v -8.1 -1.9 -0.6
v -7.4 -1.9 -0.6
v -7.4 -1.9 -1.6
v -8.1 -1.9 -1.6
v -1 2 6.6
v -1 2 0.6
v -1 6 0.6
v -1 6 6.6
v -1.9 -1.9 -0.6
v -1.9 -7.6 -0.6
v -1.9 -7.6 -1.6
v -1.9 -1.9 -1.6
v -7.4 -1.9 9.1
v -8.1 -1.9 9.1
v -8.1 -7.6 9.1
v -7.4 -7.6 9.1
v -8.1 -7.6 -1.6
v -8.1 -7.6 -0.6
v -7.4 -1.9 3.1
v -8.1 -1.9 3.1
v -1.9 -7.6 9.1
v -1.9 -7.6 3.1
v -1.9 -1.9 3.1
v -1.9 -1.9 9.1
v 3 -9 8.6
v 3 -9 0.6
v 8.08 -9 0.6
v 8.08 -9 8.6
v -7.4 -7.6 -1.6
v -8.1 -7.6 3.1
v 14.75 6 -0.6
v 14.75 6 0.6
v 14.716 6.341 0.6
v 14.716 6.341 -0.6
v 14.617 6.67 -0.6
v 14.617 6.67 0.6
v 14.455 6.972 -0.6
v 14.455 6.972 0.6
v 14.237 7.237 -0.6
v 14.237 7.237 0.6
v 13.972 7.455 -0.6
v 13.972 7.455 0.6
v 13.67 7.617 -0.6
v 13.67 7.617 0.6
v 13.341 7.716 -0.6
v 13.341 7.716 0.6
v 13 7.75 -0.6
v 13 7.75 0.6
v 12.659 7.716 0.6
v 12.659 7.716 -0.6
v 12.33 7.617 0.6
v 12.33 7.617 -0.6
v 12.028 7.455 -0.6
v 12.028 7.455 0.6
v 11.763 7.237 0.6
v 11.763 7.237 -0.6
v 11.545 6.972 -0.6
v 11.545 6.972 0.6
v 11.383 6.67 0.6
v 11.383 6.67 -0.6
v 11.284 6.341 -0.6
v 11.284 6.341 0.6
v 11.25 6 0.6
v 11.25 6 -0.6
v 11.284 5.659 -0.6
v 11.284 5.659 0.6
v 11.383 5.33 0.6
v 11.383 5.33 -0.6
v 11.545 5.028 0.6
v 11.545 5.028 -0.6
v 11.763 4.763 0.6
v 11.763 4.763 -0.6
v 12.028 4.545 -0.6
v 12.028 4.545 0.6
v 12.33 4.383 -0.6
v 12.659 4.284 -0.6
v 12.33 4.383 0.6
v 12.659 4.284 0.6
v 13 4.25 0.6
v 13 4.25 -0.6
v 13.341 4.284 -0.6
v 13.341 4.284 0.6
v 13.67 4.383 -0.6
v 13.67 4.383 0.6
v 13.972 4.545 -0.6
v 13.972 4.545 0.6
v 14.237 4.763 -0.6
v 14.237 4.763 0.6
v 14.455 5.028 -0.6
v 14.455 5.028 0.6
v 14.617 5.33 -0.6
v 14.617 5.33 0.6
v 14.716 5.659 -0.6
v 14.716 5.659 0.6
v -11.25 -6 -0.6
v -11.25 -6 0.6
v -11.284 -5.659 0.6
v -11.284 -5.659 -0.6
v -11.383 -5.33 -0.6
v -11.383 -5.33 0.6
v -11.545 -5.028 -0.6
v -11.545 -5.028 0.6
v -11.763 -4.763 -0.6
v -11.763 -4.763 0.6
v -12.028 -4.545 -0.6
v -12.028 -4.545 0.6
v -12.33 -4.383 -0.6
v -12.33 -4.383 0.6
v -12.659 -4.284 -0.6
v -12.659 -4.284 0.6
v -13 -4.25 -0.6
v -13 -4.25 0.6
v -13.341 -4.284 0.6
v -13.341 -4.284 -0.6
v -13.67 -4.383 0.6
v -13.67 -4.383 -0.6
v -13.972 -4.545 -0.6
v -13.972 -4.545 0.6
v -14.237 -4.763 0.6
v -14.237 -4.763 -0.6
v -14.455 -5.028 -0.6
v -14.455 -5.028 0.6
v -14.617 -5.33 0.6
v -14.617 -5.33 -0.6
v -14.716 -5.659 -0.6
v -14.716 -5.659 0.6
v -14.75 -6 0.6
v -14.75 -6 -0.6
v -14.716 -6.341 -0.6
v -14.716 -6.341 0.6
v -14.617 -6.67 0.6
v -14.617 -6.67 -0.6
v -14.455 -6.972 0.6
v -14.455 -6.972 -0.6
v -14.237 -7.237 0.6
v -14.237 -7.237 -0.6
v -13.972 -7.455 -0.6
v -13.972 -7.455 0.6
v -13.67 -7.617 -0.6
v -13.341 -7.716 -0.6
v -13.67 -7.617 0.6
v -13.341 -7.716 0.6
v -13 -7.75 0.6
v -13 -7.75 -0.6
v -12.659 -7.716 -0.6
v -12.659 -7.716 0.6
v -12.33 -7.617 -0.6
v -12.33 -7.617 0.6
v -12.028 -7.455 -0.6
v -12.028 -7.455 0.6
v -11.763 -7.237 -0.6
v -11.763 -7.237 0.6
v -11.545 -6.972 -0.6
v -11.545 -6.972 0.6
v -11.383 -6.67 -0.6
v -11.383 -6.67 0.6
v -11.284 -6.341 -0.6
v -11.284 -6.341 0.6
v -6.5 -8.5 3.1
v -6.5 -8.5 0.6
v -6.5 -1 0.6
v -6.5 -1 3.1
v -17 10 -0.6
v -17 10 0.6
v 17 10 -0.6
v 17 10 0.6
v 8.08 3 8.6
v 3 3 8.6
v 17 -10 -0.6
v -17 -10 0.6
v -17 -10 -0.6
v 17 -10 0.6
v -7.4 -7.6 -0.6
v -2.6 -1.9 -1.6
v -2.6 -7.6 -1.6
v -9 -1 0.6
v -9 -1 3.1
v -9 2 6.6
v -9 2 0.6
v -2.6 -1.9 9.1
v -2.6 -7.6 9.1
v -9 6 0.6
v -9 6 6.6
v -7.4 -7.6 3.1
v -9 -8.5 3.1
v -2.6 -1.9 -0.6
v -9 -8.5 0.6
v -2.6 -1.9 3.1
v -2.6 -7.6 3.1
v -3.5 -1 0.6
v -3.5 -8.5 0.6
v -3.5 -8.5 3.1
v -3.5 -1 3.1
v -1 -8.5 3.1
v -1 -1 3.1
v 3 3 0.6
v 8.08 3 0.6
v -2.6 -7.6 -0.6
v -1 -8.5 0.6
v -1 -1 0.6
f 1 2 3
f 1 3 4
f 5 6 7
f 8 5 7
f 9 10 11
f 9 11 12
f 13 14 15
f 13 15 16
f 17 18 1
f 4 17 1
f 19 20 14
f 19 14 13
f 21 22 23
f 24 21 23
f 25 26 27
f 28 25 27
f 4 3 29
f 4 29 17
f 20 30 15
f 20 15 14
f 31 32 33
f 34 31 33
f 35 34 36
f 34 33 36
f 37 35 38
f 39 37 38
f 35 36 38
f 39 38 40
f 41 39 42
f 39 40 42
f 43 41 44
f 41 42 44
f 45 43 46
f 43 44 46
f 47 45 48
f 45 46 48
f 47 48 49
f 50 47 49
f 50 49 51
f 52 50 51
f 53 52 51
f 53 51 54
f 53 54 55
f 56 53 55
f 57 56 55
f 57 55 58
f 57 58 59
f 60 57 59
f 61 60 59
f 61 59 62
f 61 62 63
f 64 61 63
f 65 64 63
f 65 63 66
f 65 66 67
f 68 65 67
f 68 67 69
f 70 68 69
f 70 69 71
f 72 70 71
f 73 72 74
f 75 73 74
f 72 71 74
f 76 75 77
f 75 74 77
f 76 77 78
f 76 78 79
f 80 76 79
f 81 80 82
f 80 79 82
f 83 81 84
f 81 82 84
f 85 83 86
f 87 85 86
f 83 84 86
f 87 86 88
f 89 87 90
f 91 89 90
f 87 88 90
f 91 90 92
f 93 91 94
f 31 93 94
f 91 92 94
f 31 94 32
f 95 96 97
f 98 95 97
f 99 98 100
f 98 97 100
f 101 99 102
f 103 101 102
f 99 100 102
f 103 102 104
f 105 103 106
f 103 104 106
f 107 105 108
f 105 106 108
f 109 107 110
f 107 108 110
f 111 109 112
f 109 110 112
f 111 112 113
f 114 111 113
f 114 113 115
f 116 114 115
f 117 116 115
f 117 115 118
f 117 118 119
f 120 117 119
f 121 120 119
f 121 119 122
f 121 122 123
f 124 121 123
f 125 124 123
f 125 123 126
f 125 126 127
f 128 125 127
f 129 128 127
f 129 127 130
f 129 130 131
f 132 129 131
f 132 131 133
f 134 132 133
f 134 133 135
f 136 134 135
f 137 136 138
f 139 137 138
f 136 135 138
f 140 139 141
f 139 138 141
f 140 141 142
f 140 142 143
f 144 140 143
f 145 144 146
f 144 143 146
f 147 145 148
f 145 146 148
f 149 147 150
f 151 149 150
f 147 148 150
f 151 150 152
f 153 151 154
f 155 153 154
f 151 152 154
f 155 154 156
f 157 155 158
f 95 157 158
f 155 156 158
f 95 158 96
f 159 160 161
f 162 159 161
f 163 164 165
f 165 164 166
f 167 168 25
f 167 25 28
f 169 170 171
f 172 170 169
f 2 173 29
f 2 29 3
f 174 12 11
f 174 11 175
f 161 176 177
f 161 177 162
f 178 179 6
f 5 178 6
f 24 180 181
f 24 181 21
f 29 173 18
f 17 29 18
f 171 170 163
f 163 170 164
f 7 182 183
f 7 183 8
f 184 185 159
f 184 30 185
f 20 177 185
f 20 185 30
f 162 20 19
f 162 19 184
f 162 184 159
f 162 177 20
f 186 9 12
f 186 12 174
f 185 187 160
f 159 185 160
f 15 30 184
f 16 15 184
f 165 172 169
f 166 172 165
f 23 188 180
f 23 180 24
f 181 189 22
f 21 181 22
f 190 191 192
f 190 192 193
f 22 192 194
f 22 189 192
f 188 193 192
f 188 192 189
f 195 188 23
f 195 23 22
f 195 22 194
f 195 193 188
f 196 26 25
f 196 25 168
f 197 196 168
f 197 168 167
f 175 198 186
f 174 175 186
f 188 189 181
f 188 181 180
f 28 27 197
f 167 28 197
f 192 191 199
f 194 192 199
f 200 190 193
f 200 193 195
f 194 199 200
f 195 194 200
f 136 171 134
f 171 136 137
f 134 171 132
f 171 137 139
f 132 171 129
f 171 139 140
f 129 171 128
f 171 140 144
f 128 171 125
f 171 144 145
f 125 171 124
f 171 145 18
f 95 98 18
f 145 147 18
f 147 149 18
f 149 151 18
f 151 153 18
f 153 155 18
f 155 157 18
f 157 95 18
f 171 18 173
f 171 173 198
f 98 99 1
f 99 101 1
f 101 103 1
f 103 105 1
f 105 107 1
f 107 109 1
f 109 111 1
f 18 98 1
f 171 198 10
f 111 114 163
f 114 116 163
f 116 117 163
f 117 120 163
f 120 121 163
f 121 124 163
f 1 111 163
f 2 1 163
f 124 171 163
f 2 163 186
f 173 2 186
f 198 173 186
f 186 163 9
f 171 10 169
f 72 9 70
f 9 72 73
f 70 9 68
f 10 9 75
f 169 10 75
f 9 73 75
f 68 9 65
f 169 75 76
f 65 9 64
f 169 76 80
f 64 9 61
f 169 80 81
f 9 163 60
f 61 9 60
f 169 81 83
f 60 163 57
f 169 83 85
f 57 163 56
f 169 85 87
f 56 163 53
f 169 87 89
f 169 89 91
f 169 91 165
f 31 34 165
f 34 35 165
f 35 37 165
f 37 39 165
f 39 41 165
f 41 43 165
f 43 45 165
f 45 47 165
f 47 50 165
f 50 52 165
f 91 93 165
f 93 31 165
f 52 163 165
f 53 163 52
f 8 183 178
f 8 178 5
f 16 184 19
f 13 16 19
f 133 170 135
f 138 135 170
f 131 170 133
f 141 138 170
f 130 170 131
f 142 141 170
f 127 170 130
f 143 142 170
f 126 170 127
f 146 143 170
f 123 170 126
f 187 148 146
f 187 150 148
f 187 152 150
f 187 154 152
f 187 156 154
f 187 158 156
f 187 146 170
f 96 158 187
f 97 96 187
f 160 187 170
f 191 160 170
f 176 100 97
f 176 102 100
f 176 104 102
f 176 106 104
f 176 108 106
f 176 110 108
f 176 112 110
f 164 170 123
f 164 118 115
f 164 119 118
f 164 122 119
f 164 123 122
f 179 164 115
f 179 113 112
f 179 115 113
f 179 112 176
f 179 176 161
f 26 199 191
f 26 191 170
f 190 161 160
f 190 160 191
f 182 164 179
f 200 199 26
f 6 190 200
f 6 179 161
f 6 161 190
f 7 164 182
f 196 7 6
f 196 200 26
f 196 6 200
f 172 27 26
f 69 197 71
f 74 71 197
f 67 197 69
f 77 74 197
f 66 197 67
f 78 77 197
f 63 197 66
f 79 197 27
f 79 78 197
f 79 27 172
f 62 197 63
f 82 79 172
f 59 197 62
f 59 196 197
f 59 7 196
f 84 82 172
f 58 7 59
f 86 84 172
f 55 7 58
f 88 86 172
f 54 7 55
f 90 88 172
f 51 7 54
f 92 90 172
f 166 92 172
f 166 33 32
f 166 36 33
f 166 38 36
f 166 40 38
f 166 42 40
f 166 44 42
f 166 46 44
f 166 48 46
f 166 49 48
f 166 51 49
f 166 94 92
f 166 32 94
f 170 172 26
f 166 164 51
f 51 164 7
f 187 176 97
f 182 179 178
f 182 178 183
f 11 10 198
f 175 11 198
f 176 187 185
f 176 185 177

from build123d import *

# Parameters (mm, degrees)
SKETCH1_W           = 34
SKETCH1_H           = 20
BOSS_EXTRUDE1_DEPTH = 0.6
SKETCH2_W           = 2.5
SKETCH2_H           = 7.5
BOSS_EXTRUDE2_DEPTH = 2.5
SKETCH3_W           = 0.7
SKETCH3_H           = 5.7
BOSS_EXTRUDE3_DEPTH = 6
SKETCH4_W           = 0.7
SKETCH4_H           = 5.7
BOSS_EXTRUDE4_DEPTH = 1
SKETCH6_W           = 5.08
SKETCH6_H           = 12
BOSS_EXTRUDE5_DEPTH = 8
SKETCH7_W           = 8
SKETCH7_H           = 4
BOSS_EXTRUDE6_DEPTH = 6
SKETCH8_R           = 1.75
CUT_EXTRUDE1_DEPTH  = 22.476731595


with BuildPart() as part:
    # Sketch1 → Boss-Extrude1 (new, symmetric)
    with BuildSketch(Plane.XY):
        Rectangle(SKETCH1_W, SKETCH1_H)
    extrude(amount=BOSS_EXTRUDE1_DEPTH, both=True)

    # Sketch2 → Boss-Extrude2 (add)
    with BuildSketch(Plane.XY.offset(0.6)):
        with Locations((-7.75, -4.75)):
            Rectangle(SKETCH2_W, SKETCH2_H)
        with Locations((-2.25, -4.75)):
            Rectangle(SKETCH2_W, SKETCH2_H)
    extrude(amount=BOSS_EXTRUDE2_DEPTH)

    # Sketch3 → Boss-Extrude3 (add)
    with BuildSketch(Plane.XY.offset(3.1)):
        with Locations((-7.75, -4.75)):
            Rectangle(SKETCH3_W, SKETCH3_H)
        with Locations((-2.25, -4.75)):
            Rectangle(SKETCH3_W, SKETCH3_H)
    extrude(amount=BOSS_EXTRUDE3_DEPTH)

    # Sketch4 → Boss-Extrude4 (add)
    with BuildSketch(Plane(origin=(0, 0, -0.6), x_dir=(-1, 0, 0), z_dir=(0, 0, -1))):
        with Locations((7.75, -4.75)):
            Rectangle(SKETCH4_W, SKETCH4_H)
        with Locations((2.25, -4.75)):
            Rectangle(SKETCH4_W, SKETCH4_H)
    extrude(amount=BOSS_EXTRUDE4_DEPTH)

    # Sketch6 → Boss-Extrude5 (add)
    with BuildSketch(Plane.XY.offset(0.6)):
        with Locations((5.54, -3)):
            Rectangle(SKETCH6_W, SKETCH6_H)
    extrude(amount=BOSS_EXTRUDE5_DEPTH)

    # Sketch7 → Boss-Extrude6 (add)
    with BuildSketch(Plane.XY.offset(0.6)):
        with Locations((-5, 4)):
            Rectangle(SKETCH7_W, SKETCH7_H)
    extrude(amount=BOSS_EXTRUDE6_DEPTH)

    # Sketch8 → Cut-Extrude1 (cut, through all)
    with BuildSketch(Plane.XY.offset(0.6)):
        with Locations((-13, -6)):
            Circle(SKETCH8_R)
        with Locations((13, 6)):
            Circle(SKETCH8_R)
    extrude(amount=-CUT_EXTRUDE1_DEPTH, mode=Mode.SUBTRACT)


solid = part.part
